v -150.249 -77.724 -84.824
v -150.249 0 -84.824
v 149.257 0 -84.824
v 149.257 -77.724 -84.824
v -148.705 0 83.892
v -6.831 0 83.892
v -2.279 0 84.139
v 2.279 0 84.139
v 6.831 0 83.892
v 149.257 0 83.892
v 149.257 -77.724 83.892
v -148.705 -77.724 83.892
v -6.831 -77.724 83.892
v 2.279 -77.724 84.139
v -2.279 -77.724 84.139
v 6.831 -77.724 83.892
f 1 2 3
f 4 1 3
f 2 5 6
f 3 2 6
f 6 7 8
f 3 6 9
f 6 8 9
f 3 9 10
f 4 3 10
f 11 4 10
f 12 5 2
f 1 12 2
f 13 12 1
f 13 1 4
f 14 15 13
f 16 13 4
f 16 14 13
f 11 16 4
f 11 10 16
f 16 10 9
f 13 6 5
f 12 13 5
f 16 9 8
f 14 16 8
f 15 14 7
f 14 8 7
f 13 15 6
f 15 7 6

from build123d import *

# Parameters (mm, degrees)
F1_DEPTH = 77.724


with BuildPart() as f1:
    # F0 (on Front) → F1 (new body)
    with BuildSketch(Plane.XZ):
        with BuildLine():
            Line((-6.8313151013, 83.892121911), (-148.7048715353, 83.892121911))
            Line((-148.7048715353, 83.892121911), (-150.2486616373, -84.8236903548))
            Line((-150.2486616373, -84.8236903548), (149.2570340633, -84.8236903548))
            Line((149.2570340633, -84.8236903548), (149.2570340633, 83.892121911))
            Line((149.2570340633, 83.892121911), (6.8313151013, 83.892121911))
            ThreePointArc((6.8313151013, 83.892121911), (61.8851573502, 57.0506992463), (84.169798531, 0))
            ThreePointArc((84.169798531, 0), (-57.0506992463, -61.8851573502), (-6.8313151013, 83.892121911))
        make_face()
        with BuildLine():
            ThreePointArc((6.8313151013, 83.892121911), (0, 84.169798531), (-6.8313151013, 83.892121911))
            Line((-6.8313151013, 83.892121911), (6.8313151013, 83.892121911))
        make_face()
        with BuildLine():
            Line((6.8313151013, 83.892121911), (-6.8313151013, 83.892121911))
            ThreePointArc((-6.8313151013, 83.892121911), (-57.0506992463, -61.8851573502), (84.169798531, 0))
            ThreePointArc((84.169798531, 0), (61.8851573502, 57.0506992463), (6.8313151013, 83.892121911))
        make_face()
    extrude(amount=F1_DEPTH)


solid = f1.part
